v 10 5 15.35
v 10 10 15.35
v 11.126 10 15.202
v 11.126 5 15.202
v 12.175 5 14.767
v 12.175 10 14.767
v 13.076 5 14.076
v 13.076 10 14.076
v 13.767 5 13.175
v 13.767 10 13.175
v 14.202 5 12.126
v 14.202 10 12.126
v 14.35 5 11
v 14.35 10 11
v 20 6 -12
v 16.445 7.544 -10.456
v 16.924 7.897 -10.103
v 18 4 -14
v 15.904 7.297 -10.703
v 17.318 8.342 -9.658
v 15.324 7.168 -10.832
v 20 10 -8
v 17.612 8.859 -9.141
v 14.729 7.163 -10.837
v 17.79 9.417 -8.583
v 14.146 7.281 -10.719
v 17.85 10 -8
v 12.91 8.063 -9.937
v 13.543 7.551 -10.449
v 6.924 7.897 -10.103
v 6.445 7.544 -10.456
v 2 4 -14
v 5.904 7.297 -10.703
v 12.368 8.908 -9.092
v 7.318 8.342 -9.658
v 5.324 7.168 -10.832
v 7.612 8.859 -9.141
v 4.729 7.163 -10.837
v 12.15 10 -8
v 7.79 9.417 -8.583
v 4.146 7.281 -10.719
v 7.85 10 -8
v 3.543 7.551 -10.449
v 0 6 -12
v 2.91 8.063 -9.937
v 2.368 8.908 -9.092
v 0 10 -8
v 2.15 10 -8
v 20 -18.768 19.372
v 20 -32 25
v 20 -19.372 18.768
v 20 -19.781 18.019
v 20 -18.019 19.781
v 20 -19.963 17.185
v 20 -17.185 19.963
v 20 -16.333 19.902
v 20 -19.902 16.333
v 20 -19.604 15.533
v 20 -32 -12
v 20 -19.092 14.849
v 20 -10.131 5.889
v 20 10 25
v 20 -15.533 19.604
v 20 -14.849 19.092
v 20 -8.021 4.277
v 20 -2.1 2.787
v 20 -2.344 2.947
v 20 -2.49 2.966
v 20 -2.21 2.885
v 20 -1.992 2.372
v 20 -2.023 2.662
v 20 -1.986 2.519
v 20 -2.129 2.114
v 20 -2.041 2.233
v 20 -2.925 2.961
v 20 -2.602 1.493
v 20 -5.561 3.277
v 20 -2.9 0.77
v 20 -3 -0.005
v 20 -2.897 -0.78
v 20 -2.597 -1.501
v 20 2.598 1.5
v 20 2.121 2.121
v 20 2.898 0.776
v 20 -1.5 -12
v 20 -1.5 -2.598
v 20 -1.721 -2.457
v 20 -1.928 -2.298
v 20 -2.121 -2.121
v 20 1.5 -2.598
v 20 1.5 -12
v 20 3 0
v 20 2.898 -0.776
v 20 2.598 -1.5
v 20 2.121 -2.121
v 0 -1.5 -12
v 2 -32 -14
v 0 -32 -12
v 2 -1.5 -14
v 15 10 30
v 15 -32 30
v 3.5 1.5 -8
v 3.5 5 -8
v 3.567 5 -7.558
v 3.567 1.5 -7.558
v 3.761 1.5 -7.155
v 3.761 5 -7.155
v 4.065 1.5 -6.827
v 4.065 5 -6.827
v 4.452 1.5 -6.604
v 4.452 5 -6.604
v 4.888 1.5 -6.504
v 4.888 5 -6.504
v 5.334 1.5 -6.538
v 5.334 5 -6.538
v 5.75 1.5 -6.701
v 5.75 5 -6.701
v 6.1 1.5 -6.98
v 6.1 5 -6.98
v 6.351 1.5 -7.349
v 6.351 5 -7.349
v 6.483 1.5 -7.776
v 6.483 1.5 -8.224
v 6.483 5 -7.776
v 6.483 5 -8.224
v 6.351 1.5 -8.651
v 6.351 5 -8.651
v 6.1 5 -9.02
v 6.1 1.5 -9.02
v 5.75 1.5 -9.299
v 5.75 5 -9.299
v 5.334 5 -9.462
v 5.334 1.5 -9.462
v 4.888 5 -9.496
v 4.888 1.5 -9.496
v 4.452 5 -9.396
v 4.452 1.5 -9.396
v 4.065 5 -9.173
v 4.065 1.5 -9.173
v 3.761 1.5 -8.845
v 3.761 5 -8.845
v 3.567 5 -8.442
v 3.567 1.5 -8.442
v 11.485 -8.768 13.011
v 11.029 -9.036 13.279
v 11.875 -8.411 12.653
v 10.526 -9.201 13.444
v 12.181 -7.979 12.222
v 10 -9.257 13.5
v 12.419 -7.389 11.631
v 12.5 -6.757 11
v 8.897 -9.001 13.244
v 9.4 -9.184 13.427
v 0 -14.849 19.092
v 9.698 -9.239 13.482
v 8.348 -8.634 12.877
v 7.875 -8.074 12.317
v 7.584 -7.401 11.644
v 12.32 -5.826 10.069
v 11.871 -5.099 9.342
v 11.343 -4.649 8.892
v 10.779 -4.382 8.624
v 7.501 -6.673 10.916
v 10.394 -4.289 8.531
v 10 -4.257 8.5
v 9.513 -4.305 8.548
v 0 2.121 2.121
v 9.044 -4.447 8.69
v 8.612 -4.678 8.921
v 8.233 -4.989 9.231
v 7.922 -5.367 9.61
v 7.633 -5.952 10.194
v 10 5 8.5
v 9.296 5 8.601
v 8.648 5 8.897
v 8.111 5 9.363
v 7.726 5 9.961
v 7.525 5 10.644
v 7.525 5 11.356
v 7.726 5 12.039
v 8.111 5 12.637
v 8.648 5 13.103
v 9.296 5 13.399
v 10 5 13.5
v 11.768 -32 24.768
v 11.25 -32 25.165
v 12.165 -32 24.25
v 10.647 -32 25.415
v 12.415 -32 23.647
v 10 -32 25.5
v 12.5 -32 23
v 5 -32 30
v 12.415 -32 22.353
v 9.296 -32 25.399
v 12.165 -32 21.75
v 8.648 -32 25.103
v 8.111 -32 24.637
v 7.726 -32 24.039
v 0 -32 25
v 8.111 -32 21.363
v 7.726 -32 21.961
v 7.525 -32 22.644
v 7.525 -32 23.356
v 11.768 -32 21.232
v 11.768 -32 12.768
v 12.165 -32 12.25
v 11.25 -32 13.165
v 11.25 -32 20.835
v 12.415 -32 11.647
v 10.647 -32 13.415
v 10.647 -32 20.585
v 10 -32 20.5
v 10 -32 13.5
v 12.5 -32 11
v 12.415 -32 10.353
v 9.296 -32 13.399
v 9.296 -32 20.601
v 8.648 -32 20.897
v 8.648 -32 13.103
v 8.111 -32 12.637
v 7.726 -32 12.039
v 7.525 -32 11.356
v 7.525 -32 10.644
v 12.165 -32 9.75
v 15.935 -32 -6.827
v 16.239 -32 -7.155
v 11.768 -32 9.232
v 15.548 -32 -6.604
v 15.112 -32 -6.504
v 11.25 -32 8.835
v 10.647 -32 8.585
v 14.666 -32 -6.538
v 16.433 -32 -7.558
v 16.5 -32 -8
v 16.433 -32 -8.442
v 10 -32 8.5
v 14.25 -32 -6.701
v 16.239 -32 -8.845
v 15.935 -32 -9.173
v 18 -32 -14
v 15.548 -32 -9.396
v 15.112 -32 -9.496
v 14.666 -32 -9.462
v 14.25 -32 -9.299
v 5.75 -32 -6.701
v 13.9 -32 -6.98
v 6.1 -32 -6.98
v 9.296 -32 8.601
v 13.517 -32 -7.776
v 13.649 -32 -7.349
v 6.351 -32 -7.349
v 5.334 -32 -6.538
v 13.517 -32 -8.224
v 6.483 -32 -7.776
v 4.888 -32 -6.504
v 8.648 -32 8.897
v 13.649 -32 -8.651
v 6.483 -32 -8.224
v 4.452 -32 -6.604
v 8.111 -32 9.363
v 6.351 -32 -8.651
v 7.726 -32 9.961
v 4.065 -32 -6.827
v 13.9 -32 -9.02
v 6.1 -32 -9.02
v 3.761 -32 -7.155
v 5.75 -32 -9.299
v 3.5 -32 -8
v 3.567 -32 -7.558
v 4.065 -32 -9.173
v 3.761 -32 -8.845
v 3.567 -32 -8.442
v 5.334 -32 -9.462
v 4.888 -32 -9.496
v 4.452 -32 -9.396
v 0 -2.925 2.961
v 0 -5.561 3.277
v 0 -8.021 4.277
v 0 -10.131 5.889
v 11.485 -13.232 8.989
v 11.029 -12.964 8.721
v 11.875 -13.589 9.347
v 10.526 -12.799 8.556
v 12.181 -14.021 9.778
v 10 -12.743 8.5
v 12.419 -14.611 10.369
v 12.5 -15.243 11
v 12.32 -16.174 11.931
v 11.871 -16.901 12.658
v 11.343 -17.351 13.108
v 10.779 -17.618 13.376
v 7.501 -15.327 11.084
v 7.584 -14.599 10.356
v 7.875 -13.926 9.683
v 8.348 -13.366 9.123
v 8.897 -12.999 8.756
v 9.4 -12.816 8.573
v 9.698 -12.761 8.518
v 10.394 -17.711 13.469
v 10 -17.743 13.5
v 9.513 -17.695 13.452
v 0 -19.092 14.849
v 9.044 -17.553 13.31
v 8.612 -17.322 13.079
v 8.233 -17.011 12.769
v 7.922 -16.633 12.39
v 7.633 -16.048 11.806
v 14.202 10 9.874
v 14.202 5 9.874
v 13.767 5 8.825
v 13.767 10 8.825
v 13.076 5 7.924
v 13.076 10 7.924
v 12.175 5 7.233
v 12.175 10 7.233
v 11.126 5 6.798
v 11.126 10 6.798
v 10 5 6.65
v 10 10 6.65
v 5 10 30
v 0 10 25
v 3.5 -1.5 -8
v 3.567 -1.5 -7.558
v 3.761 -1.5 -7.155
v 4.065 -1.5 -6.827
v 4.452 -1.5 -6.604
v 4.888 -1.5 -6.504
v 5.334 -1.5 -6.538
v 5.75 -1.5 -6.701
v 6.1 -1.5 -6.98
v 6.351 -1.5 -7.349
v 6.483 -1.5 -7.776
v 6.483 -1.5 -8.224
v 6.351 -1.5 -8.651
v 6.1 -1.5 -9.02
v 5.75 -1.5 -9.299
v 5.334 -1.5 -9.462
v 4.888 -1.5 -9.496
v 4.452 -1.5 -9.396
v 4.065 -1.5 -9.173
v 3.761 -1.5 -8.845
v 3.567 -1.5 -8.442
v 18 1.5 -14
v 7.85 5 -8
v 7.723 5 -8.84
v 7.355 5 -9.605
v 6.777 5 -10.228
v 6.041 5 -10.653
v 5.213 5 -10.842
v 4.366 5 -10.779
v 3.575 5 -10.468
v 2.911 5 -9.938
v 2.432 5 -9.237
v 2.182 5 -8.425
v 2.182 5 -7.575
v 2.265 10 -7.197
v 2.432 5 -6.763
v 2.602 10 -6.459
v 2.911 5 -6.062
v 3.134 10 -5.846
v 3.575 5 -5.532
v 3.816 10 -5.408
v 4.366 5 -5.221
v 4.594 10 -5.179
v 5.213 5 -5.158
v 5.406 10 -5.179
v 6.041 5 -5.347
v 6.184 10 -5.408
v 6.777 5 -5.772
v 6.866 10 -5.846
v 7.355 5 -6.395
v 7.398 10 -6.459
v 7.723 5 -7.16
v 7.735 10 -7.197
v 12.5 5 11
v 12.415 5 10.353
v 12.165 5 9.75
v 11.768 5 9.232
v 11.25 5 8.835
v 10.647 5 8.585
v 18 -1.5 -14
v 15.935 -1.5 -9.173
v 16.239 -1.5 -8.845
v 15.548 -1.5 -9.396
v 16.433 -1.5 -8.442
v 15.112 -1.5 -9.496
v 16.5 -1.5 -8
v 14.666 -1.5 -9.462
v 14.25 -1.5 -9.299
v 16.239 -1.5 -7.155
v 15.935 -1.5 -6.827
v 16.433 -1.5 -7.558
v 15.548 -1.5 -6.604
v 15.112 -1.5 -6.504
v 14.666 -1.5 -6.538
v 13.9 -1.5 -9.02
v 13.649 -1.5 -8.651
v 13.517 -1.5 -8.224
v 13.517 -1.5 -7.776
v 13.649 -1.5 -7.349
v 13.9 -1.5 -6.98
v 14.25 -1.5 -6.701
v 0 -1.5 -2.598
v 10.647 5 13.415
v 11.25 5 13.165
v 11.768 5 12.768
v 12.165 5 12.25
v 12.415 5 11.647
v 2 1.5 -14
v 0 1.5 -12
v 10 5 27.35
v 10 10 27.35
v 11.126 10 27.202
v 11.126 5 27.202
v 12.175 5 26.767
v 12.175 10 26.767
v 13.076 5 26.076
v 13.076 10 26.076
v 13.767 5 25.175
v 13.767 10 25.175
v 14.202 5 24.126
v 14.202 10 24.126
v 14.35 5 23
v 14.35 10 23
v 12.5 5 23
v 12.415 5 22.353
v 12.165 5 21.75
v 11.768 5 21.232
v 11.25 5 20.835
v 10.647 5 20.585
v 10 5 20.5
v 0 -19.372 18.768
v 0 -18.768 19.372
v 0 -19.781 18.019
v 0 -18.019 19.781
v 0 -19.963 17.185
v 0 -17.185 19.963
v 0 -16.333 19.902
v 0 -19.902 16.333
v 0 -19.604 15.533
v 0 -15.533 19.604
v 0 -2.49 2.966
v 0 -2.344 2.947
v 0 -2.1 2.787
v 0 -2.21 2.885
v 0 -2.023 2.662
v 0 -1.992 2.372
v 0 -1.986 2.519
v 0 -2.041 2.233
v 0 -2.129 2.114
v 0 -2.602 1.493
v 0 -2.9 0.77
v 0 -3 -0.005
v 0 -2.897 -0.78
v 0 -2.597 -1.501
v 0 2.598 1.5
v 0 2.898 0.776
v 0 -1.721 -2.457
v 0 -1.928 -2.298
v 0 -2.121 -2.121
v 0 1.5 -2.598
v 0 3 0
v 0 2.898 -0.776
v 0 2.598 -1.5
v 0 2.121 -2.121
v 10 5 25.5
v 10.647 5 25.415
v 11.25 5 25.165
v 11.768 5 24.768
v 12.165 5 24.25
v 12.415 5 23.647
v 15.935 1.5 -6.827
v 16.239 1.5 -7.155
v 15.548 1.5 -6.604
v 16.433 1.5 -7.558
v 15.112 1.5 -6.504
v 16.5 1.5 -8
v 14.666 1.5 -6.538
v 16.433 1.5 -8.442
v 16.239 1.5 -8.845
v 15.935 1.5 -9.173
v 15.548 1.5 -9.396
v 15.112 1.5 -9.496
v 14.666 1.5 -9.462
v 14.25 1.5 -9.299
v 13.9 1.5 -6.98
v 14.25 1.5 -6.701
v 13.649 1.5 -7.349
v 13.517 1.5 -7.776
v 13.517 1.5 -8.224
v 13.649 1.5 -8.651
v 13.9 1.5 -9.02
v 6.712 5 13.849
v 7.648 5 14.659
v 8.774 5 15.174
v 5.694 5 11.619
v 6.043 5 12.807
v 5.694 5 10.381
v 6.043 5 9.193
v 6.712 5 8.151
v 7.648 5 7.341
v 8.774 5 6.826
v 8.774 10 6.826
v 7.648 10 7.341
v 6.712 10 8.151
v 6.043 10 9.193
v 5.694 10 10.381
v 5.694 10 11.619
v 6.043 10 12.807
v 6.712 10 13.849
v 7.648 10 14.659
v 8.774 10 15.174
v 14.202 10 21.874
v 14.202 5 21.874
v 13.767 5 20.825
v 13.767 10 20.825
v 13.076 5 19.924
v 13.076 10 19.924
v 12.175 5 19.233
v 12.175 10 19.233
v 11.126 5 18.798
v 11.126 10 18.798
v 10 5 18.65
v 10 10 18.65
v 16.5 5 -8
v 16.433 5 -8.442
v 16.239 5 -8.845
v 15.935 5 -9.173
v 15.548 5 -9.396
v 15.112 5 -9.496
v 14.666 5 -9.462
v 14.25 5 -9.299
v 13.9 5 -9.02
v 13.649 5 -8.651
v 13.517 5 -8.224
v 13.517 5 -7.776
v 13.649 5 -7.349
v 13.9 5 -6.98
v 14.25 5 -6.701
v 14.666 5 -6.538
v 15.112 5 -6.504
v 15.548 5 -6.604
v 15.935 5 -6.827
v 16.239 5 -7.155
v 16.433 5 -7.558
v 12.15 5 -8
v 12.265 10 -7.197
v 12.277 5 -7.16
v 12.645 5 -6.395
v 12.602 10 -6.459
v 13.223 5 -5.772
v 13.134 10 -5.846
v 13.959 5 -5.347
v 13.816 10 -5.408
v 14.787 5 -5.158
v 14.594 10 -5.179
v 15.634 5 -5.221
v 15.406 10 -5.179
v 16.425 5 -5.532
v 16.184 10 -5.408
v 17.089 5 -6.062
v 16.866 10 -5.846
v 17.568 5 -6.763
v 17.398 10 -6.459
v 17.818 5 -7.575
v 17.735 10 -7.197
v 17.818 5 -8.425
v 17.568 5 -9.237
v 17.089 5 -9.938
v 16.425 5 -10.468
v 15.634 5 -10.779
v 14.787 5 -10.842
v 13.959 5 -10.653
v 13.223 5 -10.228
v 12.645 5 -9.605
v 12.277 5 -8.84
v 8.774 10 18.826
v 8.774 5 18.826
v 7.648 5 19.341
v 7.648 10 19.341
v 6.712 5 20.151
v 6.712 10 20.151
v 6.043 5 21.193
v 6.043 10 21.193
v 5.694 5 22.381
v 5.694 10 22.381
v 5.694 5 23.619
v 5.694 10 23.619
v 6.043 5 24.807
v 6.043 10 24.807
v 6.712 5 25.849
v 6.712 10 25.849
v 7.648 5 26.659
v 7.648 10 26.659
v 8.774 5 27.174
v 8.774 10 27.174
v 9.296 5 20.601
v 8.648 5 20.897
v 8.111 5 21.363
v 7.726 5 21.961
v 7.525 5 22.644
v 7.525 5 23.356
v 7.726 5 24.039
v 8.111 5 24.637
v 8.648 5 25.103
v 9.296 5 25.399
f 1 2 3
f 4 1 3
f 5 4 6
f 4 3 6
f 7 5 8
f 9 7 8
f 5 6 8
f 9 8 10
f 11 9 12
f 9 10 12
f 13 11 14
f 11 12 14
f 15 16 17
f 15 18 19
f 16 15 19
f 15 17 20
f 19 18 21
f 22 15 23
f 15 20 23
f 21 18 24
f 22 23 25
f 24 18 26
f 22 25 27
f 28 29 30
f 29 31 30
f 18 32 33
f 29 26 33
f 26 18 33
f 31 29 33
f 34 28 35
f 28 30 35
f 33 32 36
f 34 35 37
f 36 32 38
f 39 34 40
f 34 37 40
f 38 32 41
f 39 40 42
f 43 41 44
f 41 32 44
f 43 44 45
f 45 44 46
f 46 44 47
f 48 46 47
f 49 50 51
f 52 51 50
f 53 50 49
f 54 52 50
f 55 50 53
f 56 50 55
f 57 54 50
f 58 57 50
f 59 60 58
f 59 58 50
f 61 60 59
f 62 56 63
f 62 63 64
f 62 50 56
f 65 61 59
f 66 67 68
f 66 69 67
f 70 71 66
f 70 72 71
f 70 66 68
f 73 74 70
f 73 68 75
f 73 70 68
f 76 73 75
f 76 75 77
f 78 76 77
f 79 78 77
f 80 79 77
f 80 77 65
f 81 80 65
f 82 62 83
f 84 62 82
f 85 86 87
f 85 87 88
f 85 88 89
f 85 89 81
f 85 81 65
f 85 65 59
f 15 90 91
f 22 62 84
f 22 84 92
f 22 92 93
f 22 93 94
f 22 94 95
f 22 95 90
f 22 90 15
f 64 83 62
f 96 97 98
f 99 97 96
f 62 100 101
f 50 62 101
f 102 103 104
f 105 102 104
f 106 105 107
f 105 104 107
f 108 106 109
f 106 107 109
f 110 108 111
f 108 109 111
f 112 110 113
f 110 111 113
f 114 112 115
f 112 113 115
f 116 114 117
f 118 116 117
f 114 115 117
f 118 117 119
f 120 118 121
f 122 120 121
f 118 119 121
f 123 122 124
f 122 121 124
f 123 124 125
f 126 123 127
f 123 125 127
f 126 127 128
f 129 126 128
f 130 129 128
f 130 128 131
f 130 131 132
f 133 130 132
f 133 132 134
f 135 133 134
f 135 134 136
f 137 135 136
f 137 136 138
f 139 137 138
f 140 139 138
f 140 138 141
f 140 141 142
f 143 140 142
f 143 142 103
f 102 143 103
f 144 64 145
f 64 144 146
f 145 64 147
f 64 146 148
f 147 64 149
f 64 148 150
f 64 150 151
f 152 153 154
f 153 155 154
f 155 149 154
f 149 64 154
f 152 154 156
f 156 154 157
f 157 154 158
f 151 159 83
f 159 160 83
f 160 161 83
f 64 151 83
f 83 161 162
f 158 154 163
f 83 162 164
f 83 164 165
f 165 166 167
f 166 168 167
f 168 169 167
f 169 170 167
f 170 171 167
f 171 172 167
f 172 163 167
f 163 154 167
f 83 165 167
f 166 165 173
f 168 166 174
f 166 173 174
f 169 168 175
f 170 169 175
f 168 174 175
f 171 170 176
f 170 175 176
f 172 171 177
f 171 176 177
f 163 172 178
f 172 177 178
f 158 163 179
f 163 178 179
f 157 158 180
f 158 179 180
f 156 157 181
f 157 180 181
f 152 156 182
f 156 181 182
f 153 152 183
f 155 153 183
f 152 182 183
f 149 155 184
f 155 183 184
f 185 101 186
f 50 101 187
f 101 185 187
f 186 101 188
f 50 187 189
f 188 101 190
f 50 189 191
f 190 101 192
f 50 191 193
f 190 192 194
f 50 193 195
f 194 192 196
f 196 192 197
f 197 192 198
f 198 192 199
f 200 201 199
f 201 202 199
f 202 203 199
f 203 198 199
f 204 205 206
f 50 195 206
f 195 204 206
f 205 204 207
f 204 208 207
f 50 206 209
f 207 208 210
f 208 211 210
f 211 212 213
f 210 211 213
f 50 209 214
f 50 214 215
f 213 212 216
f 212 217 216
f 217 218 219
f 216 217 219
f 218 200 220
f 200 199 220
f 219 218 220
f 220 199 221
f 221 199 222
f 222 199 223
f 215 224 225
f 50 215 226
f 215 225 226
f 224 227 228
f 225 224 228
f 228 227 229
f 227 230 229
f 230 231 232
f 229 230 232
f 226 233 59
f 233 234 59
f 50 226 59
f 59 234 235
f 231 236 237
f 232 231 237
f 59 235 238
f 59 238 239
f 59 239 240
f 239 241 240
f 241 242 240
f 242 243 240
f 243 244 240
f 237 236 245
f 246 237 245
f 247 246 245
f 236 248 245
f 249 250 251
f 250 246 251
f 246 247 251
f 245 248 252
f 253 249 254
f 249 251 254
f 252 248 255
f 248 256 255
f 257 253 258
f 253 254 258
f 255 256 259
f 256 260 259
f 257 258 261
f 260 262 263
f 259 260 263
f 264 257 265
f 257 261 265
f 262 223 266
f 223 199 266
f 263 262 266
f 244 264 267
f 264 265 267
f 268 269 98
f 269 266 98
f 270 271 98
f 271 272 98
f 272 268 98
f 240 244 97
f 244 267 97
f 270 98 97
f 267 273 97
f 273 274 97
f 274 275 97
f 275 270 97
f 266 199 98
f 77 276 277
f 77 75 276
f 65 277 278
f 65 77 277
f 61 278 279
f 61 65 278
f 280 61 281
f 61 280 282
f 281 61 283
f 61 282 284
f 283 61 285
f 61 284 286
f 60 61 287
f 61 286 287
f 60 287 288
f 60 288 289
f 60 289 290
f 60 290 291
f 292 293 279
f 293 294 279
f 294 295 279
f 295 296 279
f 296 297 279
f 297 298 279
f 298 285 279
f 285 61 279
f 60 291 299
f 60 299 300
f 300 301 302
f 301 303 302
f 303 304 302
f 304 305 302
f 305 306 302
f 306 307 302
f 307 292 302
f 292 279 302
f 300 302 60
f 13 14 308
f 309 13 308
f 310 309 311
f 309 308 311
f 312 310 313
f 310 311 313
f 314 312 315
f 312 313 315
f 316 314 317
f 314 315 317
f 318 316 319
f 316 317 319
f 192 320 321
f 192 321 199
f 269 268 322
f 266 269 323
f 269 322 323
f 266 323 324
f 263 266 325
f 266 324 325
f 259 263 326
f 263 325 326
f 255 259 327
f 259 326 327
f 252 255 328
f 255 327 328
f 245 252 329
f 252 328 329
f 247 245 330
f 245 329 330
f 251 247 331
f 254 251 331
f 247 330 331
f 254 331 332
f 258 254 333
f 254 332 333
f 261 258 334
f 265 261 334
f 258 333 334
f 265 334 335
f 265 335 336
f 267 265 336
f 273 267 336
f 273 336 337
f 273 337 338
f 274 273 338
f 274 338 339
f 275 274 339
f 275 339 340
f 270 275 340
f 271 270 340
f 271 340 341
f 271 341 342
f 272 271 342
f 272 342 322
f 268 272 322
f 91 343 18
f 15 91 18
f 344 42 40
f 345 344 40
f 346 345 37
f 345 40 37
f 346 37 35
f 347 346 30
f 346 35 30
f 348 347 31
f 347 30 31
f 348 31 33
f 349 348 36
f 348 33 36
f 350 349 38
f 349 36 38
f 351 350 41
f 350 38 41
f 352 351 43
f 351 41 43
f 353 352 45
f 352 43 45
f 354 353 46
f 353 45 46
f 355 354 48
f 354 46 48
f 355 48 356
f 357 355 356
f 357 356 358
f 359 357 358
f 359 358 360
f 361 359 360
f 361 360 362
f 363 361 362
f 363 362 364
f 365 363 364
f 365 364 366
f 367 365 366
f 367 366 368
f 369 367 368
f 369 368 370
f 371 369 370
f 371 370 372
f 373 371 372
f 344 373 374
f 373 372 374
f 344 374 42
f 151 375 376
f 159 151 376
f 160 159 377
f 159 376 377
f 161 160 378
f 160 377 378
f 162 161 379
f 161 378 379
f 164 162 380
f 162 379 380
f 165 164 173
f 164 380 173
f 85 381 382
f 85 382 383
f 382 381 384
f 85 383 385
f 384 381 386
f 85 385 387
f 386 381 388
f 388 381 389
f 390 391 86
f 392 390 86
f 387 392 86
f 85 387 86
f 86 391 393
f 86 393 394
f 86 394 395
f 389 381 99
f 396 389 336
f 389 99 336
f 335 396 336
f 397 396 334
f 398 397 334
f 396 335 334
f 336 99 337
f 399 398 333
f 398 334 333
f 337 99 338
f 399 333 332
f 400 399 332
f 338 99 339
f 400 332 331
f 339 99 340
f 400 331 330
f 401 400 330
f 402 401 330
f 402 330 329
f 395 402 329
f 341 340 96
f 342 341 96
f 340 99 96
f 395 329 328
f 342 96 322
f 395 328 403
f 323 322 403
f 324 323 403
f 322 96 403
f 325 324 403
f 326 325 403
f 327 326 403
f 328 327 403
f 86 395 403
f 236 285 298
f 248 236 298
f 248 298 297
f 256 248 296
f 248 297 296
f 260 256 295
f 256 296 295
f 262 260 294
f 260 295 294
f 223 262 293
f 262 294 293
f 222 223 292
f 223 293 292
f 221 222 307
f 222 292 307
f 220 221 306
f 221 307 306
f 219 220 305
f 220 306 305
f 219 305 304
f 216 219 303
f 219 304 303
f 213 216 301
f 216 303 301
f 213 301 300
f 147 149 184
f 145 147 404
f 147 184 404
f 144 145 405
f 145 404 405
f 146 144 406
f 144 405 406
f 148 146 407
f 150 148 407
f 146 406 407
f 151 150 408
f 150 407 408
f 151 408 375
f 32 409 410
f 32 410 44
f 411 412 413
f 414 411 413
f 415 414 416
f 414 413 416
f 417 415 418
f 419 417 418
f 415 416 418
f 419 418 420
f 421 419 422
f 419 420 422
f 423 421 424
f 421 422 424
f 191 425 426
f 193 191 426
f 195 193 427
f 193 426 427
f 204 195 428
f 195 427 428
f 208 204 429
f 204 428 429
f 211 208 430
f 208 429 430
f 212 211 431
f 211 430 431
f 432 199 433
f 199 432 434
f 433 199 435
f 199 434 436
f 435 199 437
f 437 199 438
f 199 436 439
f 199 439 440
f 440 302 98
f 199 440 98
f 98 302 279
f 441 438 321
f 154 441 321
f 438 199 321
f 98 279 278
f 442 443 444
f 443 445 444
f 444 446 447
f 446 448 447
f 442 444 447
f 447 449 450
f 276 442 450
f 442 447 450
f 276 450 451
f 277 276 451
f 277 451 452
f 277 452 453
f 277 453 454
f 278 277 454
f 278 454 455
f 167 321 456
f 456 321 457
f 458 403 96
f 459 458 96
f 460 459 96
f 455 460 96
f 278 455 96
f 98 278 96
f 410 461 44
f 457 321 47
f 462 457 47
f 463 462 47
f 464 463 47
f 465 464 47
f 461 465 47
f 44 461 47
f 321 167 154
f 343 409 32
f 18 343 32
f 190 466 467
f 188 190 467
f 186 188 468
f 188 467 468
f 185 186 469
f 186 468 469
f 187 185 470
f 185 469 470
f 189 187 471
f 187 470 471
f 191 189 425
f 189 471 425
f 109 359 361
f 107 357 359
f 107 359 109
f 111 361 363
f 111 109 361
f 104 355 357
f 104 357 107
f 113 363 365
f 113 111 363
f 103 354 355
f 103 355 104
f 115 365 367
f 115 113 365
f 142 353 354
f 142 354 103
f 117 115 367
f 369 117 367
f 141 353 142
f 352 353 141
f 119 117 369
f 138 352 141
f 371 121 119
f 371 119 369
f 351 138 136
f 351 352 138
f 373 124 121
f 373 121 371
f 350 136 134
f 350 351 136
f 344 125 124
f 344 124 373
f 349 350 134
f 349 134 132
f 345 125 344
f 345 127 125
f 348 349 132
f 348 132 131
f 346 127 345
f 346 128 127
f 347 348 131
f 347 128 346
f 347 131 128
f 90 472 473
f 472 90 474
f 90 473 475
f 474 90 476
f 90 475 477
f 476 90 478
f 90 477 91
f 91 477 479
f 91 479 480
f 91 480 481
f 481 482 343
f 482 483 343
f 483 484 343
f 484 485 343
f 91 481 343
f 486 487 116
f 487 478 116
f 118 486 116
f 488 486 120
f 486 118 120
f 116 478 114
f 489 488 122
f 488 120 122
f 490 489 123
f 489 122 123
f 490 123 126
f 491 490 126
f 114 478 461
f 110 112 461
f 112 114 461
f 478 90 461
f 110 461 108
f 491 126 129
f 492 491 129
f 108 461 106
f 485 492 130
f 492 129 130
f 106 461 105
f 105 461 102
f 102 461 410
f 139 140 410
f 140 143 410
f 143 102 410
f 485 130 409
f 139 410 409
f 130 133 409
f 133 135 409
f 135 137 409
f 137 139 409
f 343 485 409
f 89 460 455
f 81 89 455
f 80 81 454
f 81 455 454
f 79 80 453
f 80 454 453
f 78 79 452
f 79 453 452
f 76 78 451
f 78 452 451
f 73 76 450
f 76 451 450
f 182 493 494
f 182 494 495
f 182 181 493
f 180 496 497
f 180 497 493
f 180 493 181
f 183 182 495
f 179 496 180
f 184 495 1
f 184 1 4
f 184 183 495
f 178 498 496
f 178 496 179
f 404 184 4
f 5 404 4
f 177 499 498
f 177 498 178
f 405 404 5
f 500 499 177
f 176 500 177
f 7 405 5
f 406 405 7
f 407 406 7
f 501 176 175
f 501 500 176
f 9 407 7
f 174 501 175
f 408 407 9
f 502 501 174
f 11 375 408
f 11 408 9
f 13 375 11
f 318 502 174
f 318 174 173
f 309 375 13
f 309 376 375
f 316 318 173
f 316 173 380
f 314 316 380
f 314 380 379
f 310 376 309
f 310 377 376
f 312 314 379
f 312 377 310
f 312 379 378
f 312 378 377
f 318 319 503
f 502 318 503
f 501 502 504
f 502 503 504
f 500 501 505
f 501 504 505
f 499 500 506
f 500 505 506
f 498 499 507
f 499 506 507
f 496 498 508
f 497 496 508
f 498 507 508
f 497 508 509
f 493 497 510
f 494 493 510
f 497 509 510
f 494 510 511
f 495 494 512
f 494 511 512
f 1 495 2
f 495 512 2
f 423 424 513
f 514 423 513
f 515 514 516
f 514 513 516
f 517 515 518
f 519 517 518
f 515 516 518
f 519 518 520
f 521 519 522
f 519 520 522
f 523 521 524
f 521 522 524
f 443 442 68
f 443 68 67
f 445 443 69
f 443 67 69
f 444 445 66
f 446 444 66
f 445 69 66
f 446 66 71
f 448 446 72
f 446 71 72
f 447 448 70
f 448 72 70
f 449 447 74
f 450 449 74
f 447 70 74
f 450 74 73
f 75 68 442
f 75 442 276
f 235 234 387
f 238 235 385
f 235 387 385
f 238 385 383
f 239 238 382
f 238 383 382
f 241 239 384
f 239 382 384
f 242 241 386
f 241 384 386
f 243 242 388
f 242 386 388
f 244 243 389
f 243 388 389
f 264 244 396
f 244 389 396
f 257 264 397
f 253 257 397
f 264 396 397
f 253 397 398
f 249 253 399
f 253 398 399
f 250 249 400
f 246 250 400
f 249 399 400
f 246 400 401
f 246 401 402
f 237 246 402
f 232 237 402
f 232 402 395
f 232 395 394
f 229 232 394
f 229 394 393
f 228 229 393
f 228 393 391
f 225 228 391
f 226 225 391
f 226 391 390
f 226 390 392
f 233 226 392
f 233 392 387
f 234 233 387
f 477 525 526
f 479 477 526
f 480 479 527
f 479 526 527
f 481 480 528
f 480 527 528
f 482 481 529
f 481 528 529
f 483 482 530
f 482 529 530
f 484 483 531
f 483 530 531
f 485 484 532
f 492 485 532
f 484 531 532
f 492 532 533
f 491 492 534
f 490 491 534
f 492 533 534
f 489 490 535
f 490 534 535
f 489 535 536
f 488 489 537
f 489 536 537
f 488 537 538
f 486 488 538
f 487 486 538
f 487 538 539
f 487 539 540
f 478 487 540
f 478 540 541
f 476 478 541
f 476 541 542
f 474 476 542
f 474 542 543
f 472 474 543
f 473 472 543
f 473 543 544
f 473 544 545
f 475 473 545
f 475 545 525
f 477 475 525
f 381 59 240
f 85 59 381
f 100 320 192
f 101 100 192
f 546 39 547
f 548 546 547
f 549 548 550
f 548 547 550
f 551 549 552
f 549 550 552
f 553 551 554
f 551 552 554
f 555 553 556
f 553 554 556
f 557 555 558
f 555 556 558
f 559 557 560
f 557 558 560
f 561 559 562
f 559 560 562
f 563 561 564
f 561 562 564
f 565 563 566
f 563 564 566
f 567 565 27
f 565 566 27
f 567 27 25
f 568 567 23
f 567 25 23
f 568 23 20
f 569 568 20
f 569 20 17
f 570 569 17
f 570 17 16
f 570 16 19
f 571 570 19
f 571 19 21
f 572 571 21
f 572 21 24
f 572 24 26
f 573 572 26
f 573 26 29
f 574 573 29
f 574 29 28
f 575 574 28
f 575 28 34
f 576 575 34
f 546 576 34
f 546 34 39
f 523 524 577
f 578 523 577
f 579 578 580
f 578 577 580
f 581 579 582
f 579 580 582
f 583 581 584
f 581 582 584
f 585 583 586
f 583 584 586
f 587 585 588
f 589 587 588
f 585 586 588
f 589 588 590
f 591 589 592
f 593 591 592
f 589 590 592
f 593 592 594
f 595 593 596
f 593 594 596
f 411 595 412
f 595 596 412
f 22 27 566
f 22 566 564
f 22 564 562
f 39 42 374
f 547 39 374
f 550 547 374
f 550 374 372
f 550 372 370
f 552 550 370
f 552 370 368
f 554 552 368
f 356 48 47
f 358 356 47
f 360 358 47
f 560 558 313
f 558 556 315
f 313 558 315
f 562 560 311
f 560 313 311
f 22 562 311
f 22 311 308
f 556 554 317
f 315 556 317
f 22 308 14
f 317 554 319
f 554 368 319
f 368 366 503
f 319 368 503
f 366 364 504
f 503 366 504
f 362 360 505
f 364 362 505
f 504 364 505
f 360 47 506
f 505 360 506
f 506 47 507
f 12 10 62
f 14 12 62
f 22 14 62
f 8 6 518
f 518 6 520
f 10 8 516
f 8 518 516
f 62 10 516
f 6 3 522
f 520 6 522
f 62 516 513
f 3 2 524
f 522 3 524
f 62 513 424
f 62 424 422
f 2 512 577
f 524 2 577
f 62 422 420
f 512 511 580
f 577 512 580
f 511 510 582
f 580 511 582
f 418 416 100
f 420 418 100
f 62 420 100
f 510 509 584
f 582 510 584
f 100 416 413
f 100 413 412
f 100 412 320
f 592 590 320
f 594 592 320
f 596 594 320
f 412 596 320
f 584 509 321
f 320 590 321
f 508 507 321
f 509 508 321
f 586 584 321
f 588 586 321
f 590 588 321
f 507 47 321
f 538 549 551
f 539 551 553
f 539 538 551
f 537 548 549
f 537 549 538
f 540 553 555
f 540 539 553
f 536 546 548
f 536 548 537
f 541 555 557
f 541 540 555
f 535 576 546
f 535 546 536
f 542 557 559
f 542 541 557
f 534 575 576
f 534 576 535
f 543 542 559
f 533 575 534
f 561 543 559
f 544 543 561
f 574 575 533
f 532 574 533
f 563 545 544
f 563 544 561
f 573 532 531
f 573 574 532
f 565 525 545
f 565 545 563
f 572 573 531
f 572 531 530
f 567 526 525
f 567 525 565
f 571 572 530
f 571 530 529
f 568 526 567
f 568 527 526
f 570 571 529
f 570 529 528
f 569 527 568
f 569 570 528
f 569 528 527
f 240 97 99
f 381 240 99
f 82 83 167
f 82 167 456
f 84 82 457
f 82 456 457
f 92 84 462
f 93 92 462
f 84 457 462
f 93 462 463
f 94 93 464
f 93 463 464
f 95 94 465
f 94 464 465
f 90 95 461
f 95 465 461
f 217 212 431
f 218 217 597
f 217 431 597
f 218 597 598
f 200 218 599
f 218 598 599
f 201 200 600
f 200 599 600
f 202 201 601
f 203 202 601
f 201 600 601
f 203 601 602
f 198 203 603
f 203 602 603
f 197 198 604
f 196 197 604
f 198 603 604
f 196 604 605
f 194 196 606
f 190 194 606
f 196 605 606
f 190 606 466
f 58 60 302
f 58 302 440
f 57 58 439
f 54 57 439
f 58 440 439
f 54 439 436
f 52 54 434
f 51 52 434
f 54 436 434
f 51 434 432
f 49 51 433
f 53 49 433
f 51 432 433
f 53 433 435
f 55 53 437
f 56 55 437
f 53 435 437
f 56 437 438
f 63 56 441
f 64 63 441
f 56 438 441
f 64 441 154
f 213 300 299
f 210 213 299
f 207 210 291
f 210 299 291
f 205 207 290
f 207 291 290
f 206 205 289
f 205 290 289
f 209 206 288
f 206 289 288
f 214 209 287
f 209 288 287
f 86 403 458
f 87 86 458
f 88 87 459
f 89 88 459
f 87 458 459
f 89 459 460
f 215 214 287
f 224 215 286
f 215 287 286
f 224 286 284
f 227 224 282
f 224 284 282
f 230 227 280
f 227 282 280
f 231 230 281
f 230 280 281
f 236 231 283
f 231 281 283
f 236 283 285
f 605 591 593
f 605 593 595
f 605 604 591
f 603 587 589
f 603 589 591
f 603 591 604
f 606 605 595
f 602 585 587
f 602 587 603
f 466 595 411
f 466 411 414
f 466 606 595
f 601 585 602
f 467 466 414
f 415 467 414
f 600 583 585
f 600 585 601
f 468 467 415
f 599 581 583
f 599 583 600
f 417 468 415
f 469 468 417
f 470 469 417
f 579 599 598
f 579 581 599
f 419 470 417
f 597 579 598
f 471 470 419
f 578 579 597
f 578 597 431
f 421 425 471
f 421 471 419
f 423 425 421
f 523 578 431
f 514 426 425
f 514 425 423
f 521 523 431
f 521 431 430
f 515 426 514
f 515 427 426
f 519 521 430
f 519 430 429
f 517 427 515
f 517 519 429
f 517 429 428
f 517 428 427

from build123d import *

# Parameters (mm, degrees)
EXTRUDE_1_DEPTH     = 20
FILLET_1_R          = 10
FILLET_2_R          = 0.5
SKETCH_2_R          = 4.35
SKETCH_2_R_2        = 2.5
CUT_EXTRUDE_1_DEPTH = 5
SKETCH_2_3_R        = 2.85
SKETCH_2_3_R_2      = 1.5
CUT_EXTRUDE_2_DEPTH = 5
SKETCH_2_4_R        = 2.5
SKETCH_2_4_R_2      = 1.5
CUT_EXTRUDE_3_DEPTH = 56.353410012
CHAMFER_1_SIZE      = 5
CHAMFER_2_SIZE      = 2


with BuildPart() as part:
    # 스케치1 → 보스-돌출1 (new body)
    with BuildSketch(Plane(origin=(0, 0, 0), x_dir=(0, 0, -1), z_dir=(1, 0, 0))):
        with BuildLine():
            ThreePointArc((-14.849242405, -19.091883092), (-19.091883092, -19.091883092), (-19.091883092, -14.849242405))
            Line((-19.091883092, -14.849242405), (-2.121320344, 2.121320344))
            ThreePointArc((-2.121320344, 2.121320344), (0.391578577, 2.974334584), (2.598076211, 1.5))
            Line((2.598076211, 1.5), (14, 1.5))
            Line((14, 1.5), (14, 4))
            Line((14, 4), (8, 10))
            Line((8, 10), (-30, 10))
            Line((-30, 10), (-30, -32))
            Line((-30, -32), (14, -32))
            Line((14, -32), (14, -1.5))
            Line((14, -1.5), (2.598076211, -1.5))
            ThreePointArc((2.598076211, -1.5), (-0.737259989, -2.907997199), (-2.998906144, -0.081005802))
            Line((-2.998906144, -0.081005802), (-2.903502563, -7.14614325))
            Line((-2.903502563, -7.14614325), (-14.849242405, -19.091883092))
        make_face()
    extrude(amount=EXTRUDE_1_DEPTH)

    # 필렛1
    fillet_1_edges = [part.edges().sort_by_distance(p)[0] for p in [
        (10, -7.14614325, 2.903502563),
    ]]
    fillet(fillet_1_edges, radius=FILLET_1_R)

    # 필렛2
    fillet_2_edges = [part.edges().sort_by_distance(p)[0] for p in [
        (10, -0.081005802, 2.998906144),
    ]]
    fillet(fillet_2_edges, radius=FILLET_2_R)

    # 스케치2 → 컷-돌출1 (cut)
    # profile 1 of 2: a face of its own
    with BuildSketch(Plane(origin=(0, 10, 0), x_dir=(1, 0, 0), z_dir=(0, 1, 0))):
        with Locations((10, -11)):
            Circle(SKETCH_2_R)
        with Locations((10, -11)):
            Circle(SKETCH_2_R_2, mode=Mode.SUBTRACT)
    # profile 2 of 2: a face of its own
    with BuildSketch(Plane(origin=(0, 10, 0), x_dir=(1, 0, 0), z_dir=(0, 1, 0))):
        with Locations((10, -23)):
            Circle(SKETCH_2_R)
        with Locations((10, -23)):
            Circle(SKETCH_2_R_2, mode=Mode.SUBTRACT)
    extrude(amount=-CUT_EXTRUDE_1_DEPTH, mode=Mode.SUBTRACT)

    # 스케치2<3> → 컷-돌출2 (cut)
    # profile 1 of 2: a face of its own
    with BuildSketch(Plane(origin=(0, 10, 0), x_dir=(1, 0, 0), z_dir=(0, 1, 0))):
        with Locations((5, 8)):
            Circle(SKETCH_2_3_R)
        with Locations((5, 8)):
            Circle(SKETCH_2_3_R_2, mode=Mode.SUBTRACT)
    # profile 2 of 2: a face of its own
    with BuildSketch(Plane(origin=(0, 10, 0), x_dir=(1, 0, 0), z_dir=(0, 1, 0))):
        with Locations((15, 8)):
            Circle(SKETCH_2_3_R)
        with Locations((15, 8)):
            Circle(SKETCH_2_3_R_2, mode=Mode.SUBTRACT)
    extrude(amount=-CUT_EXTRUDE_2_DEPTH, mode=Mode.SUBTRACT)

    # 스케치2<4> → 컷-돌출3 (cut, through all)
    with BuildSketch(Plane(origin=(0, 10, 0), x_dir=(1, 0, 0), z_dir=(0, 1, 0))):
        with Locations((10, -11)):
            Circle(SKETCH_2_4_R)
        with Locations((15, 8)):
            Circle(SKETCH_2_4_R_2)
        with Locations((5, 8)):
            Circle(SKETCH_2_4_R_2)
        with Locations((10, -23)):
            Circle(SKETCH_2_4_R)
    extrude(amount=-CUT_EXTRUDE_3_DEPTH, mode=Mode.SUBTRACT)

    # 모따기1
    chamfer_1_edges = [part.edges().sort_by_distance(p)[0] for p in [
        (20, -11, 30),
        (0, -11, 30),
    ]]
    chamfer(chamfer_1_edges, length=CHAMFER_1_SIZE)

    # 모따기2
    chamfer_2_edges = [part.edges().sort_by_distance(p)[0] for p in [
        (0, -16.75, -14),
        (0, 2.75, -14),
        (20, 2.75, -14),
        (20, -16.75, -14),
    ]]
    chamfer(chamfer_2_edges, length=CHAMFER_2_SIZE)


solid = part.part
